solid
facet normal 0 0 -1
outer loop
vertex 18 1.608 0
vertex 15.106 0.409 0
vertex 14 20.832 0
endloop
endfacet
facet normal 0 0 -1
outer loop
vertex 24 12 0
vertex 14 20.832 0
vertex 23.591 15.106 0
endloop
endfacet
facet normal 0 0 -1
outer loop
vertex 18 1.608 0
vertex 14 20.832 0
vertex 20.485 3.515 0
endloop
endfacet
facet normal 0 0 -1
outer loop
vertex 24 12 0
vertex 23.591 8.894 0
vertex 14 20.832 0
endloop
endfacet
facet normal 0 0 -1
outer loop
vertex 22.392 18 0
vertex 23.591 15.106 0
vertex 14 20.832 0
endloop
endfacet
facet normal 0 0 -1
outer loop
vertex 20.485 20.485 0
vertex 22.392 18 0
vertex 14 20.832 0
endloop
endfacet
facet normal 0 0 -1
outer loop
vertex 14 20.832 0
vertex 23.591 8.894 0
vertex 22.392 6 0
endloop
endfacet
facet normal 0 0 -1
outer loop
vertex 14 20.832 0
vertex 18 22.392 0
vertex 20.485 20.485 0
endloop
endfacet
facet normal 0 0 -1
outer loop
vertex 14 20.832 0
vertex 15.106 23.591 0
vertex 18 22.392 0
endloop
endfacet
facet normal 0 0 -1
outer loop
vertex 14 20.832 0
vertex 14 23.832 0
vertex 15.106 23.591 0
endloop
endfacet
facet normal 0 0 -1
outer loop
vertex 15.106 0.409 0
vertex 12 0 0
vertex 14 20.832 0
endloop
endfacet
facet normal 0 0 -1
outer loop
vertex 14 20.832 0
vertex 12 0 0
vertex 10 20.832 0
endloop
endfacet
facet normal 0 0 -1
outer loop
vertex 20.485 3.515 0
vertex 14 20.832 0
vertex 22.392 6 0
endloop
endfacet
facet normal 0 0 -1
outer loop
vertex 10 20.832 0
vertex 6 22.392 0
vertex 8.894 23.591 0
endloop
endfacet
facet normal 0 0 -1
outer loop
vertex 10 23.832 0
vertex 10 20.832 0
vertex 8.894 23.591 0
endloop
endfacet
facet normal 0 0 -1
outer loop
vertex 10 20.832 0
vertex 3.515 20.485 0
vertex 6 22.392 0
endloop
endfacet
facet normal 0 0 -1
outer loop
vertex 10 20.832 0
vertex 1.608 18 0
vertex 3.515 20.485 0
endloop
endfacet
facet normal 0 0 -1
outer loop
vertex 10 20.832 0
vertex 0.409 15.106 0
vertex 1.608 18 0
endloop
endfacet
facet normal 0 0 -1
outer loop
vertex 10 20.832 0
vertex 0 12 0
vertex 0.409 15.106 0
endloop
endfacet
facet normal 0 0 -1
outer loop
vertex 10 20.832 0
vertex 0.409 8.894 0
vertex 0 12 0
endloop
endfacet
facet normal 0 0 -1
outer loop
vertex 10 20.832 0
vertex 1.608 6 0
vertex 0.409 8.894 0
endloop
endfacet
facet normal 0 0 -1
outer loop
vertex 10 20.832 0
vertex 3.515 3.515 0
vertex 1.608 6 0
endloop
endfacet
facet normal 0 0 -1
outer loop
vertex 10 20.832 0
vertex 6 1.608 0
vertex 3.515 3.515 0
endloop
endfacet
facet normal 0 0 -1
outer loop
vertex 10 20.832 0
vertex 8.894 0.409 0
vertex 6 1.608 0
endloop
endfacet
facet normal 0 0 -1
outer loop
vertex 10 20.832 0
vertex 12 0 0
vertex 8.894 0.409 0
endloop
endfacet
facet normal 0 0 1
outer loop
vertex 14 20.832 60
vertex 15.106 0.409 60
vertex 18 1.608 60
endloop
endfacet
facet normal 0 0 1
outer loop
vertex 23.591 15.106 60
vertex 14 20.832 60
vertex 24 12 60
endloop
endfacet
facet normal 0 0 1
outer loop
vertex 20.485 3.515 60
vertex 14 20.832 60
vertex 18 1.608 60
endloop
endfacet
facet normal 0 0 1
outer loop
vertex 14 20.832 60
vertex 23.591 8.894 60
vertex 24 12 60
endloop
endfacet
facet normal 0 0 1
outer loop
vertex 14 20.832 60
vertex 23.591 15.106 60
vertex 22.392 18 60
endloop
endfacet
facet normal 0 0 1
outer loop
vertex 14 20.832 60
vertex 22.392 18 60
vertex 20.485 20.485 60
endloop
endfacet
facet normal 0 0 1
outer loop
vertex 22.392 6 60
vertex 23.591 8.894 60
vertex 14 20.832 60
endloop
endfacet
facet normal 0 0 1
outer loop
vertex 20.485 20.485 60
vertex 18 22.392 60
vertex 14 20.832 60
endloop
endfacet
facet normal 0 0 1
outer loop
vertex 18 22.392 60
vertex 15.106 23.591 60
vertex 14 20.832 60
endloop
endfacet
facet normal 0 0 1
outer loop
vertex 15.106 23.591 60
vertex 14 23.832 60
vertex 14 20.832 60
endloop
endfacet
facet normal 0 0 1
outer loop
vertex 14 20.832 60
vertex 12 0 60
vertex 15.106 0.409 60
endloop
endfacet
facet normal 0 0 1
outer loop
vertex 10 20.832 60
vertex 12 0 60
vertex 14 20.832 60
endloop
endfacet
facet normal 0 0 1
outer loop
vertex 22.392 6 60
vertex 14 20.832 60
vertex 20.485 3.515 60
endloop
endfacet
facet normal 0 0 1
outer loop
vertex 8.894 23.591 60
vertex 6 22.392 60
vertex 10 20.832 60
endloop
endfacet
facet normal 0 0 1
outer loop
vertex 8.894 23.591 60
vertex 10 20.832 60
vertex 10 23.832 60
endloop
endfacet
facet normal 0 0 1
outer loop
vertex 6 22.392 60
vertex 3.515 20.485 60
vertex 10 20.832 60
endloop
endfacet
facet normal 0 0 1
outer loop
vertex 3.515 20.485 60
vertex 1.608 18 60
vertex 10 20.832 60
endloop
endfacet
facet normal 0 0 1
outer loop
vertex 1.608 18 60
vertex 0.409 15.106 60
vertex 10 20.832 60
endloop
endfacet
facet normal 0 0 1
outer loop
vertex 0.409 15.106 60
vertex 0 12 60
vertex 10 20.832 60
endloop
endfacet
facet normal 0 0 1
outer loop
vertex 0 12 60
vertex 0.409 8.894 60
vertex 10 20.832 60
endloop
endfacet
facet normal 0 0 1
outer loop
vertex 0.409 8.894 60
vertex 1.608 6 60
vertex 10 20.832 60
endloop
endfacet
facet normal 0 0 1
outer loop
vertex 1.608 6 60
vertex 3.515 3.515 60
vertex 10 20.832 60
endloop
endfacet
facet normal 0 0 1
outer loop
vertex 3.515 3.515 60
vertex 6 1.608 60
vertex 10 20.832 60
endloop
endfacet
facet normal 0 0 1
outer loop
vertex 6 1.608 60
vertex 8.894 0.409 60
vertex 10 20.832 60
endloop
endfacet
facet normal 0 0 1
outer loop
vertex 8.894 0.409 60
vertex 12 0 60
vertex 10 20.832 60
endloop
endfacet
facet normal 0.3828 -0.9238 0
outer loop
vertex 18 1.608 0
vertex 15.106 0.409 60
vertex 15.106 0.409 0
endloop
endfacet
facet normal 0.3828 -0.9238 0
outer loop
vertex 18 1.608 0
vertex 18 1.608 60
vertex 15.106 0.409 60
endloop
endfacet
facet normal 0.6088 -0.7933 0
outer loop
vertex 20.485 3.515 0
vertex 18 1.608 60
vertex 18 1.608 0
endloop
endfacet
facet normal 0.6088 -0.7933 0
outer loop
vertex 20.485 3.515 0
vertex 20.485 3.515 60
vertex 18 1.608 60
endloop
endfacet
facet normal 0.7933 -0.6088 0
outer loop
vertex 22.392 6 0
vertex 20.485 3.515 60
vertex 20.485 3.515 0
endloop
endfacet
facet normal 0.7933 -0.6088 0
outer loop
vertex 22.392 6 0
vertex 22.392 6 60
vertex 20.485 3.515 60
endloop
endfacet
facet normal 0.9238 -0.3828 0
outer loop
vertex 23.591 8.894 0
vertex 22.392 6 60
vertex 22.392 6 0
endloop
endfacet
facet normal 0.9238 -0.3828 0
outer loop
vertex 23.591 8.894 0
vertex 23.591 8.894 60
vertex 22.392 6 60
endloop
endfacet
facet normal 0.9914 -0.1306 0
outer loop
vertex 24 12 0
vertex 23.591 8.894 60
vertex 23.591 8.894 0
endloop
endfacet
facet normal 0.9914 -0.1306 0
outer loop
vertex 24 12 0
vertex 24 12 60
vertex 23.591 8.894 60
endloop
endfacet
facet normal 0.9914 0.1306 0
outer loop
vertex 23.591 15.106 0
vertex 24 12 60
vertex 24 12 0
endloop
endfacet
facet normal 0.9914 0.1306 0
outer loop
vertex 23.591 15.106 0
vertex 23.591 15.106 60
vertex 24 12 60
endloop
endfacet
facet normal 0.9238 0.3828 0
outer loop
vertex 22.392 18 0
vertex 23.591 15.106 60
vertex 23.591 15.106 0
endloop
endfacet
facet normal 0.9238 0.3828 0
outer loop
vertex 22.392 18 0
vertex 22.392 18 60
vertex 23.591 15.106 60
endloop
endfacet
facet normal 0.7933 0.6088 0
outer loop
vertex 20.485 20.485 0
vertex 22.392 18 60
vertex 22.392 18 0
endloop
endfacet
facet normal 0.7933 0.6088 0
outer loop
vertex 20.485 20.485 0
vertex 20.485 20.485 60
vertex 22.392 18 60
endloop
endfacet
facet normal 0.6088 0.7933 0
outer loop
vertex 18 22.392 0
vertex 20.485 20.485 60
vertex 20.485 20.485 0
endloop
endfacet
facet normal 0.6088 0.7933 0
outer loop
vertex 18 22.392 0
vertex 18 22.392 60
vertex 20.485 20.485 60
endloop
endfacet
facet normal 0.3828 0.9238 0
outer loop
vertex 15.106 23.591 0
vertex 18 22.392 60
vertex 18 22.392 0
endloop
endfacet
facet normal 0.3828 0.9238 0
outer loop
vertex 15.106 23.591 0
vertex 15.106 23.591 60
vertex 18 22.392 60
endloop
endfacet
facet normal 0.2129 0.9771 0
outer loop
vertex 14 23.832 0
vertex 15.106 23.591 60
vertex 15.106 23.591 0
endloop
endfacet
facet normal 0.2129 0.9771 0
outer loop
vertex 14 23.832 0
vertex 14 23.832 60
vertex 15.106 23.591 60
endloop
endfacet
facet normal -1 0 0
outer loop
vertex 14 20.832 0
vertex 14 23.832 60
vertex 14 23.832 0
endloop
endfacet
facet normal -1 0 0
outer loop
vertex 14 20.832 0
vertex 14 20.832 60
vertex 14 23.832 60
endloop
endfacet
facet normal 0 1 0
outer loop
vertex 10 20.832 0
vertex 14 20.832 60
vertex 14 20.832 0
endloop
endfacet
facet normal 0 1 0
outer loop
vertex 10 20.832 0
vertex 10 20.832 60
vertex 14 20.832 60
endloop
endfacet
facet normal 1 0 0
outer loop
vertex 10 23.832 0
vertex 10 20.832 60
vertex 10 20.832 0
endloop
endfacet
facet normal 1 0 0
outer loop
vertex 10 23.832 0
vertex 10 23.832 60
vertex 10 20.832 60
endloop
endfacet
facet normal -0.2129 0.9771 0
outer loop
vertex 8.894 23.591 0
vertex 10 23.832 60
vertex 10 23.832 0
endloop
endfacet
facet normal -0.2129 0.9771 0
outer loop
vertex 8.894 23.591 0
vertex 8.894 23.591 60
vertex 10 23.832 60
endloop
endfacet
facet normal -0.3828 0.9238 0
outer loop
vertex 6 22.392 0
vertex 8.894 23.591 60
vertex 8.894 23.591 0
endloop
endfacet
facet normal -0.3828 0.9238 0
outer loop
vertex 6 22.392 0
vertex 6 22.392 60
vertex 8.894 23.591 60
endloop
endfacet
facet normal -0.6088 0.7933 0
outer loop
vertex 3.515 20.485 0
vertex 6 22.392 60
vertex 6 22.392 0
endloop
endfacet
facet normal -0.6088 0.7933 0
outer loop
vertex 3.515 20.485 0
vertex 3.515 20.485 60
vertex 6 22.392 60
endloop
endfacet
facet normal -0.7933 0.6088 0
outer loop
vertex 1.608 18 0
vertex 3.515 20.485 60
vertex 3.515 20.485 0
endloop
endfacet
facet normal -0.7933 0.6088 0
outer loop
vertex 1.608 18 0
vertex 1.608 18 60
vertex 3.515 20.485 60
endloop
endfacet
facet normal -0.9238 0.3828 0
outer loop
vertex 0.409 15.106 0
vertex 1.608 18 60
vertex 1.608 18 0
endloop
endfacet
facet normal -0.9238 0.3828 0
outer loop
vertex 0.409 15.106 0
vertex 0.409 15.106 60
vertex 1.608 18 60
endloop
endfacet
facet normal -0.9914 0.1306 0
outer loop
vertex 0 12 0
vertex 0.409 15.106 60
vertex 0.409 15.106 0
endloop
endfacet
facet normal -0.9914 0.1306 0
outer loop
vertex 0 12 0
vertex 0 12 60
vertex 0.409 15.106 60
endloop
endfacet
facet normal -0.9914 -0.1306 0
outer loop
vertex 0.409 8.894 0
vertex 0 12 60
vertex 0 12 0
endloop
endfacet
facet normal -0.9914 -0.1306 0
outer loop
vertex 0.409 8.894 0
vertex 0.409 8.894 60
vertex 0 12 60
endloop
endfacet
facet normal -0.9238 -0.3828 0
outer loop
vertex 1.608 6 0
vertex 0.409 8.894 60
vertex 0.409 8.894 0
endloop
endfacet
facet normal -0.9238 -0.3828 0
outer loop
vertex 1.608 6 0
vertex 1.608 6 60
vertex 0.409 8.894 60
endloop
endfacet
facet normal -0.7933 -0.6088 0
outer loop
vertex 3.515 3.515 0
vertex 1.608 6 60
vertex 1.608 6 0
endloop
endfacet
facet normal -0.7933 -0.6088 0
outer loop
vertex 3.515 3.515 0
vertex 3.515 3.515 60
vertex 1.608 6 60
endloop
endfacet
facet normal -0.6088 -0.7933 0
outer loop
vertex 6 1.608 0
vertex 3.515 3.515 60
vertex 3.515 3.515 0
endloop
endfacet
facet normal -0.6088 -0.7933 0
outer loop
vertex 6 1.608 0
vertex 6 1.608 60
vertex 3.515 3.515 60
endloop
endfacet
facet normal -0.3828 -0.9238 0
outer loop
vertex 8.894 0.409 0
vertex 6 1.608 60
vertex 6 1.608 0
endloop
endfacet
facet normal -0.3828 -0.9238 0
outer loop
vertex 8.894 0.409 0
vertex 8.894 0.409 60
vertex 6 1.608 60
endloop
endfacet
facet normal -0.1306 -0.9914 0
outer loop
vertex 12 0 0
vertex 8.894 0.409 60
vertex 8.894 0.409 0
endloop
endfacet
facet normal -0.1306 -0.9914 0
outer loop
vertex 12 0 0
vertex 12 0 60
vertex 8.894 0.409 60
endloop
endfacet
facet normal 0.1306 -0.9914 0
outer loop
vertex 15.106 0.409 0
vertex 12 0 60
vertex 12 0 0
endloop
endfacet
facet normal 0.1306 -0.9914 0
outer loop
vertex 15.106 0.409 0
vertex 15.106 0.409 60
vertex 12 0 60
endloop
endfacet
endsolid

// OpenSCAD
$fn = 32;

// ----------------------------------------------------------------------
// Keyway shaft: d24 shaft, key 4 x 3 mm
// ----------------------------------------------------------------------

// --- parameters (mm) ---
shaft_r = 12;             // shaft radius
key_w = 4;                // keyway width
key_d = 3;                // keyway depth below the surface line
plate_t = 60;             // shaft length, Z (extrusion height)
fit_tol = 0.02;           // declared fit tolerance (prompt contract)
free_tol = 0.2;           // declared free tolerance (prompt contract)

shaft_d = 2 * shaft_r;  // shaft diameter
circle_step = 15;  // polygon sampling step, degrees

profile = [[8.894, 23.591], [6, 22.392], [3.515, 20.485], [1.608, 18], [0.409, 15.106], [0, 12], [0.409, 8.894], [1.608, 6], [3.515, 3.515], [6, 1.608], [8.894, 0.409], [12, 0], [15.106, 0.409], [18, 1.608], [20.485, 3.515], [22.392, 6], [23.591, 8.894], [24, 12], [23.591, 15.106], [22.392, 18], [20.485, 20.485], [18, 22.392], [15.106, 23.591], [14, 23.832], [14, 20.832], [10, 20.832], [10, 23.832]];  // primary outline, 27 points, counter clockwise

// --- the one profile operation ---
linear_extrude(height = plate_t) polygon(points = profile);
